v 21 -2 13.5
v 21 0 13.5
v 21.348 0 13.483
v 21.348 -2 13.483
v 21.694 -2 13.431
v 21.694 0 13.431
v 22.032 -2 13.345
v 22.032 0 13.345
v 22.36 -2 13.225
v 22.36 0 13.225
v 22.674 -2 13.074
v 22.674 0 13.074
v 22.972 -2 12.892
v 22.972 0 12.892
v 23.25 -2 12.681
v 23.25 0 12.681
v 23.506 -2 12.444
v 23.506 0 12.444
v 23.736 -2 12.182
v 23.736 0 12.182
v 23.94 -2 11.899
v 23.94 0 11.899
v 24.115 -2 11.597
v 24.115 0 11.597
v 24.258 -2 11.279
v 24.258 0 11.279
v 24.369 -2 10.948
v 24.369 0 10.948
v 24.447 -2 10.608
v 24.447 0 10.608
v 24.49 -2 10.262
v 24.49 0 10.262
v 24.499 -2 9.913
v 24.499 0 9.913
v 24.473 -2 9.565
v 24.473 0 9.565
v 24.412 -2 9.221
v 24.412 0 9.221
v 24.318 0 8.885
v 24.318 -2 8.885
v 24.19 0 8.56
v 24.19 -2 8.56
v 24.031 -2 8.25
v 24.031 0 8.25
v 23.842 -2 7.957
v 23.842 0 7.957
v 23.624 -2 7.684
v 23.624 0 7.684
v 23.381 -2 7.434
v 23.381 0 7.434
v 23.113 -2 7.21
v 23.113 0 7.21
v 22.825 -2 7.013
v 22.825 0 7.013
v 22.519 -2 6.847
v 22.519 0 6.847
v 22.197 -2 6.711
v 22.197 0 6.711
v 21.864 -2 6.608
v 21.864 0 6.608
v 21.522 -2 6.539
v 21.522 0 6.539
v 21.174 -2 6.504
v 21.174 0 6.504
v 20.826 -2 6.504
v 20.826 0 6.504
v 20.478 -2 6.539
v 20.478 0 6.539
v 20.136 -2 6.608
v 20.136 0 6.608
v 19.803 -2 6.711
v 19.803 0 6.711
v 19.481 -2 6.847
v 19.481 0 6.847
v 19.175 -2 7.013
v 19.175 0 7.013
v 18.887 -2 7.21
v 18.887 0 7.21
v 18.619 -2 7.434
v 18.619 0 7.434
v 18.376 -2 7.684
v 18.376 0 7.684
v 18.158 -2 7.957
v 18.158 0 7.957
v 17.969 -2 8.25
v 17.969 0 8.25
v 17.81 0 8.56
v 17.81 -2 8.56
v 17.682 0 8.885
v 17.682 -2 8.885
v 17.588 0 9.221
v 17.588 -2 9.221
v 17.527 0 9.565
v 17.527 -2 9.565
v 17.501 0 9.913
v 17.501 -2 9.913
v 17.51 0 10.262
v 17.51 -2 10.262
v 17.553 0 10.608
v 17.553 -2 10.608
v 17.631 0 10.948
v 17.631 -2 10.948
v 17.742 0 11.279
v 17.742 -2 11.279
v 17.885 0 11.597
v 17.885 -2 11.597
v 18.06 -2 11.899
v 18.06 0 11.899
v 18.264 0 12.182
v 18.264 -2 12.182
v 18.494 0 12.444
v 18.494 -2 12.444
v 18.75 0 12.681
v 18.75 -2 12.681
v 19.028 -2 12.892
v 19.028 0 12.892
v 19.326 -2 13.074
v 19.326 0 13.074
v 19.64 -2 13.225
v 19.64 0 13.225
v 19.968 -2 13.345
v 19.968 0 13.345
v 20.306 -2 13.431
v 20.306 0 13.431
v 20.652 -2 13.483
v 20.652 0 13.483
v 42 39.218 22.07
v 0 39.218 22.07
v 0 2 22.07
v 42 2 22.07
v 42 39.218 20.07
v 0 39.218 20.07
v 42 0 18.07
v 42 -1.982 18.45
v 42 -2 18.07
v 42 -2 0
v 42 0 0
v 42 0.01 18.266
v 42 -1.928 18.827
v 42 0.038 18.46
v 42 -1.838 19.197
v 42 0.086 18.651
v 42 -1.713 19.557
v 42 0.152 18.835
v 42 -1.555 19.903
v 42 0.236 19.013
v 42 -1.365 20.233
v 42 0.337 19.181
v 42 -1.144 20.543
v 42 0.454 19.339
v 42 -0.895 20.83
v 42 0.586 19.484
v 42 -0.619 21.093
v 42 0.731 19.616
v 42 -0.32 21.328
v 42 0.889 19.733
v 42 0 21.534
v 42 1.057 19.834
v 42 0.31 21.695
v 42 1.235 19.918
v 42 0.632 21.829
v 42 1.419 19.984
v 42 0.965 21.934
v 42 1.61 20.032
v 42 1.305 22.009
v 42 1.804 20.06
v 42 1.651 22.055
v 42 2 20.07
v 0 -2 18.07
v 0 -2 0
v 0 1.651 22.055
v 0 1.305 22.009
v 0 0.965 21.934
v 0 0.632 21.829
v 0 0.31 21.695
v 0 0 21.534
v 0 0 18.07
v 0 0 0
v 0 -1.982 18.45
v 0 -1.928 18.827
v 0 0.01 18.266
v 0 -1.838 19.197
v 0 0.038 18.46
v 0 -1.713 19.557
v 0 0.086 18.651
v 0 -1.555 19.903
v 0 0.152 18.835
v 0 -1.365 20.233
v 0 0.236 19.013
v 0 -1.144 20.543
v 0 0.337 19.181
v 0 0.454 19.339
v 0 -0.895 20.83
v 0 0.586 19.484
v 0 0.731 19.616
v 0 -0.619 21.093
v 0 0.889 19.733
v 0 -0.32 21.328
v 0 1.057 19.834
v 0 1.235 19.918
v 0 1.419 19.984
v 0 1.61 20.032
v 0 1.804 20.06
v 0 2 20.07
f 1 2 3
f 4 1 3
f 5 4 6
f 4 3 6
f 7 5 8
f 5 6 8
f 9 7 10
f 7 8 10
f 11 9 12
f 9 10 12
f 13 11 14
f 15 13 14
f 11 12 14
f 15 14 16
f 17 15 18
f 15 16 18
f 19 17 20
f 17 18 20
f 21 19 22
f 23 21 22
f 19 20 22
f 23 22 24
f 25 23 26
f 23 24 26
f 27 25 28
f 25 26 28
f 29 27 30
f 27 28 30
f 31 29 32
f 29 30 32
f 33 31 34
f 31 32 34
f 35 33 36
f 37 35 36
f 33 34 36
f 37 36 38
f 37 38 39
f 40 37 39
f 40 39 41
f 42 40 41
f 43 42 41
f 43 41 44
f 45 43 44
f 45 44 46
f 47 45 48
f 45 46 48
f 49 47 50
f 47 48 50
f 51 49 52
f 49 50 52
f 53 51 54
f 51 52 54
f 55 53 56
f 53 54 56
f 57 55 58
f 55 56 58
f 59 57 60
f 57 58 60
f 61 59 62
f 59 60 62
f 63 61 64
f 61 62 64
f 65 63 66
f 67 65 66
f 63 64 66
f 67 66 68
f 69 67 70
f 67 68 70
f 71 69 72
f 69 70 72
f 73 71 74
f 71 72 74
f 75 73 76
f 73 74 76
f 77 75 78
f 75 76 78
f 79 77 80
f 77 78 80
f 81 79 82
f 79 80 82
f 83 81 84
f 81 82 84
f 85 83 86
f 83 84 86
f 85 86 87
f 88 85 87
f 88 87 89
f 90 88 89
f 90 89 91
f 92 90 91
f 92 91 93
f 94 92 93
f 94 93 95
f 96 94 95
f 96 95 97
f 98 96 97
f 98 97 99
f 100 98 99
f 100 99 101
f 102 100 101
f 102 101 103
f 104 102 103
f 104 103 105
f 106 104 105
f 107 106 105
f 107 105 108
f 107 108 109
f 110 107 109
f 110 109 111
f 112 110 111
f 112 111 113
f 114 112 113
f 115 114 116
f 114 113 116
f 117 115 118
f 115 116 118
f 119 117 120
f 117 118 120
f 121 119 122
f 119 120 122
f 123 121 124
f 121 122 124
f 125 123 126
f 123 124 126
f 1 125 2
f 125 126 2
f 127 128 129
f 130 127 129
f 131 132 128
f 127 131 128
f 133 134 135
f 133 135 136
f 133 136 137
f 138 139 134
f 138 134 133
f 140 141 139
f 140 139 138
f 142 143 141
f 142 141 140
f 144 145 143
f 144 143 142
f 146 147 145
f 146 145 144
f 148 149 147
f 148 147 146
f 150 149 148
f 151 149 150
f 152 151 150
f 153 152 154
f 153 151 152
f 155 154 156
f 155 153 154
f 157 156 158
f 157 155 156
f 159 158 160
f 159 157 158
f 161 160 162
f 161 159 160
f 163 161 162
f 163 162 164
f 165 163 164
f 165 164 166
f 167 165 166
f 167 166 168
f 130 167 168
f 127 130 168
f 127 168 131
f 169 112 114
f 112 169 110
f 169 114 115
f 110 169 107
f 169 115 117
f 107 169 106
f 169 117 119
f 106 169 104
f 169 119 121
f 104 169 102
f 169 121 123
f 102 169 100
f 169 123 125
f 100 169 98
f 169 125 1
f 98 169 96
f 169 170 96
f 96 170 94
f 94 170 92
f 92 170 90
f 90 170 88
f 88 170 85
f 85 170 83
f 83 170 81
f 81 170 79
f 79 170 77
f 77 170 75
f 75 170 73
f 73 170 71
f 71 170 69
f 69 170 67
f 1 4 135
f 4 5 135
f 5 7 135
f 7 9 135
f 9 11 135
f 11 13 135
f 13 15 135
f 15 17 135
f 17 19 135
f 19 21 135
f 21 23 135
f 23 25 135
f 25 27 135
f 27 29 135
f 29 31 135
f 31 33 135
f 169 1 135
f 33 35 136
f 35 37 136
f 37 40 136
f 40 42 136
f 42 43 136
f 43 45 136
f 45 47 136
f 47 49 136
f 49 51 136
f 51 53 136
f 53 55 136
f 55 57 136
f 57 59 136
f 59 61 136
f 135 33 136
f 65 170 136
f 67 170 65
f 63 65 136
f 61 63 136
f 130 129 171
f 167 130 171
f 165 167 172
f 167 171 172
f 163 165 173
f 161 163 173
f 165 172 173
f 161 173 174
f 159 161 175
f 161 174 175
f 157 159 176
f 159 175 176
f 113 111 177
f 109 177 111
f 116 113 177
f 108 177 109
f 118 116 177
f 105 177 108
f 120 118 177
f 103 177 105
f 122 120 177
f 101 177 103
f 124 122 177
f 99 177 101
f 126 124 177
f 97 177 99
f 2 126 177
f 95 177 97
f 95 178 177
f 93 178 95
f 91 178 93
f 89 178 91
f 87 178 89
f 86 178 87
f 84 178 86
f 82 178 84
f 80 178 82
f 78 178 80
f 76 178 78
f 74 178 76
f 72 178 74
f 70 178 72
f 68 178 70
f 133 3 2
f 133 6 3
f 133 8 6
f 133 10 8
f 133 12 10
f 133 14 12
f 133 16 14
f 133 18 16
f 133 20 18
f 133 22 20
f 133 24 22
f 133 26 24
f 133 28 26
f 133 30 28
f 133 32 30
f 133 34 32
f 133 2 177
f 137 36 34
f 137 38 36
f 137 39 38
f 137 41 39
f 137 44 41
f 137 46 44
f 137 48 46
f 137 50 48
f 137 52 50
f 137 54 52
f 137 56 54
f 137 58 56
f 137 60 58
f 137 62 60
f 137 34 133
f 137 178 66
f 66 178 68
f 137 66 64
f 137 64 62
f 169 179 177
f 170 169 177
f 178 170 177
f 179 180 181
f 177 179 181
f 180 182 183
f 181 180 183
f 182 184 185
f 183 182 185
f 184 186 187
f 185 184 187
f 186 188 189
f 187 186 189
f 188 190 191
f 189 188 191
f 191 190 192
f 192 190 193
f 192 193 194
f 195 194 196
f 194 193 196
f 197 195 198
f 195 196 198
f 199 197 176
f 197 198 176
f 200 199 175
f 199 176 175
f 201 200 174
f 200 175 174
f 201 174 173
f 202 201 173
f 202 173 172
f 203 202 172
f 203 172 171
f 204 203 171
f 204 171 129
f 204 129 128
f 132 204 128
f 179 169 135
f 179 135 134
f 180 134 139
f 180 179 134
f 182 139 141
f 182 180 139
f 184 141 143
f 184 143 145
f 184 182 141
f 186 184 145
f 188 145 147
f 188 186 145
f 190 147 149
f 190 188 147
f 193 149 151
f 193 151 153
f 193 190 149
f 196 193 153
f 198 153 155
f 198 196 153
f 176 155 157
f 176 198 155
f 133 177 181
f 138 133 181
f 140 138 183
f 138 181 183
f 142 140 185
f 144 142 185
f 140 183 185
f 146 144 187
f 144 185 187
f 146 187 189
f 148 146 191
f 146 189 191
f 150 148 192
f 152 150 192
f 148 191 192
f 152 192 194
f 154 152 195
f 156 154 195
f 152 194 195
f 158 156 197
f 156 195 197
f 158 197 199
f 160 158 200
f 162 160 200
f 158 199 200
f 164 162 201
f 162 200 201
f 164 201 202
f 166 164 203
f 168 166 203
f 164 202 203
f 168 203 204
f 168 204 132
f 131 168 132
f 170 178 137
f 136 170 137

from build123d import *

# Parameters (mm, degrees)
SKETCH1_W              = 42
SKETCH1_H              = 60
SKETCH1_R              = 3.5
BASE_FLANGE2_DEPTH     = 2
SKETCHED_BEND1_DEPTH   = 42
SKETCHED_BEND1_2_DEPTH = 42


# Read off the part's stored shape, not the designer's step: Sketched Bend1
# Sheet-metal steps are written as plain solids
with BuildPart() as part:
    # Sketch1 → Base-Flange2 (new body)
    with BuildSketch(Plane(origin=(0, 0, 0), x_dir=(1, 0, 0), z_dir=(0, 1, 0))):
        with Locations((21, -30)):
            Rectangle(SKETCH1_W, SKETCH1_H)
        with Locations(Location((21, -10, 0), (0, 0, 270))):
            Circle(SKETCH1_R, mode=Mode.SUBTRACT)
    extrude(amount=-BASE_FLANGE2_DEPTH)

    # Sketched Bend1 outline → Sketched Bend1 (cut)
    with BuildSketch(Plane.YZ):
        with BuildLine():
            ThreePointArc((-2, 18.07), (-1.464101615, 20.07), (0, 21.534101616))
            Line((0, 21.534101616), (0, 60))
            Line((0, 60), (-2, 60))
            Line((-2, 60), (-2, 18.07))
        make_face()
    extrude(amount=SKETCHED_BEND1_DEPTH, mode=Mode.SUBTRACT)

    # Sketched Bend1 2 outline → Sketched Bend1 2 (add)
    with BuildSketch(Plane.YZ):
        with BuildLine():
            ThreePointArc((0, 18.07), (0.585786438, 19.484213562), (2, 20.07))
            Line((2, 20.07), (39.21761102, 20.07))
            Line((39.21761102, 20.07), (39.21761102, 22.07))
            Line((39.21761102, 22.07), (2, 22.07))
            ThreePointArc((2, 22.07), (0.96472382, 21.933703305), (0, 21.534101616))
            Line((0, 21.534101616), (0, 18.07))
        make_face()
    extrude(amount=SKETCHED_BEND1_2_DEPTH)


solid = part.part
